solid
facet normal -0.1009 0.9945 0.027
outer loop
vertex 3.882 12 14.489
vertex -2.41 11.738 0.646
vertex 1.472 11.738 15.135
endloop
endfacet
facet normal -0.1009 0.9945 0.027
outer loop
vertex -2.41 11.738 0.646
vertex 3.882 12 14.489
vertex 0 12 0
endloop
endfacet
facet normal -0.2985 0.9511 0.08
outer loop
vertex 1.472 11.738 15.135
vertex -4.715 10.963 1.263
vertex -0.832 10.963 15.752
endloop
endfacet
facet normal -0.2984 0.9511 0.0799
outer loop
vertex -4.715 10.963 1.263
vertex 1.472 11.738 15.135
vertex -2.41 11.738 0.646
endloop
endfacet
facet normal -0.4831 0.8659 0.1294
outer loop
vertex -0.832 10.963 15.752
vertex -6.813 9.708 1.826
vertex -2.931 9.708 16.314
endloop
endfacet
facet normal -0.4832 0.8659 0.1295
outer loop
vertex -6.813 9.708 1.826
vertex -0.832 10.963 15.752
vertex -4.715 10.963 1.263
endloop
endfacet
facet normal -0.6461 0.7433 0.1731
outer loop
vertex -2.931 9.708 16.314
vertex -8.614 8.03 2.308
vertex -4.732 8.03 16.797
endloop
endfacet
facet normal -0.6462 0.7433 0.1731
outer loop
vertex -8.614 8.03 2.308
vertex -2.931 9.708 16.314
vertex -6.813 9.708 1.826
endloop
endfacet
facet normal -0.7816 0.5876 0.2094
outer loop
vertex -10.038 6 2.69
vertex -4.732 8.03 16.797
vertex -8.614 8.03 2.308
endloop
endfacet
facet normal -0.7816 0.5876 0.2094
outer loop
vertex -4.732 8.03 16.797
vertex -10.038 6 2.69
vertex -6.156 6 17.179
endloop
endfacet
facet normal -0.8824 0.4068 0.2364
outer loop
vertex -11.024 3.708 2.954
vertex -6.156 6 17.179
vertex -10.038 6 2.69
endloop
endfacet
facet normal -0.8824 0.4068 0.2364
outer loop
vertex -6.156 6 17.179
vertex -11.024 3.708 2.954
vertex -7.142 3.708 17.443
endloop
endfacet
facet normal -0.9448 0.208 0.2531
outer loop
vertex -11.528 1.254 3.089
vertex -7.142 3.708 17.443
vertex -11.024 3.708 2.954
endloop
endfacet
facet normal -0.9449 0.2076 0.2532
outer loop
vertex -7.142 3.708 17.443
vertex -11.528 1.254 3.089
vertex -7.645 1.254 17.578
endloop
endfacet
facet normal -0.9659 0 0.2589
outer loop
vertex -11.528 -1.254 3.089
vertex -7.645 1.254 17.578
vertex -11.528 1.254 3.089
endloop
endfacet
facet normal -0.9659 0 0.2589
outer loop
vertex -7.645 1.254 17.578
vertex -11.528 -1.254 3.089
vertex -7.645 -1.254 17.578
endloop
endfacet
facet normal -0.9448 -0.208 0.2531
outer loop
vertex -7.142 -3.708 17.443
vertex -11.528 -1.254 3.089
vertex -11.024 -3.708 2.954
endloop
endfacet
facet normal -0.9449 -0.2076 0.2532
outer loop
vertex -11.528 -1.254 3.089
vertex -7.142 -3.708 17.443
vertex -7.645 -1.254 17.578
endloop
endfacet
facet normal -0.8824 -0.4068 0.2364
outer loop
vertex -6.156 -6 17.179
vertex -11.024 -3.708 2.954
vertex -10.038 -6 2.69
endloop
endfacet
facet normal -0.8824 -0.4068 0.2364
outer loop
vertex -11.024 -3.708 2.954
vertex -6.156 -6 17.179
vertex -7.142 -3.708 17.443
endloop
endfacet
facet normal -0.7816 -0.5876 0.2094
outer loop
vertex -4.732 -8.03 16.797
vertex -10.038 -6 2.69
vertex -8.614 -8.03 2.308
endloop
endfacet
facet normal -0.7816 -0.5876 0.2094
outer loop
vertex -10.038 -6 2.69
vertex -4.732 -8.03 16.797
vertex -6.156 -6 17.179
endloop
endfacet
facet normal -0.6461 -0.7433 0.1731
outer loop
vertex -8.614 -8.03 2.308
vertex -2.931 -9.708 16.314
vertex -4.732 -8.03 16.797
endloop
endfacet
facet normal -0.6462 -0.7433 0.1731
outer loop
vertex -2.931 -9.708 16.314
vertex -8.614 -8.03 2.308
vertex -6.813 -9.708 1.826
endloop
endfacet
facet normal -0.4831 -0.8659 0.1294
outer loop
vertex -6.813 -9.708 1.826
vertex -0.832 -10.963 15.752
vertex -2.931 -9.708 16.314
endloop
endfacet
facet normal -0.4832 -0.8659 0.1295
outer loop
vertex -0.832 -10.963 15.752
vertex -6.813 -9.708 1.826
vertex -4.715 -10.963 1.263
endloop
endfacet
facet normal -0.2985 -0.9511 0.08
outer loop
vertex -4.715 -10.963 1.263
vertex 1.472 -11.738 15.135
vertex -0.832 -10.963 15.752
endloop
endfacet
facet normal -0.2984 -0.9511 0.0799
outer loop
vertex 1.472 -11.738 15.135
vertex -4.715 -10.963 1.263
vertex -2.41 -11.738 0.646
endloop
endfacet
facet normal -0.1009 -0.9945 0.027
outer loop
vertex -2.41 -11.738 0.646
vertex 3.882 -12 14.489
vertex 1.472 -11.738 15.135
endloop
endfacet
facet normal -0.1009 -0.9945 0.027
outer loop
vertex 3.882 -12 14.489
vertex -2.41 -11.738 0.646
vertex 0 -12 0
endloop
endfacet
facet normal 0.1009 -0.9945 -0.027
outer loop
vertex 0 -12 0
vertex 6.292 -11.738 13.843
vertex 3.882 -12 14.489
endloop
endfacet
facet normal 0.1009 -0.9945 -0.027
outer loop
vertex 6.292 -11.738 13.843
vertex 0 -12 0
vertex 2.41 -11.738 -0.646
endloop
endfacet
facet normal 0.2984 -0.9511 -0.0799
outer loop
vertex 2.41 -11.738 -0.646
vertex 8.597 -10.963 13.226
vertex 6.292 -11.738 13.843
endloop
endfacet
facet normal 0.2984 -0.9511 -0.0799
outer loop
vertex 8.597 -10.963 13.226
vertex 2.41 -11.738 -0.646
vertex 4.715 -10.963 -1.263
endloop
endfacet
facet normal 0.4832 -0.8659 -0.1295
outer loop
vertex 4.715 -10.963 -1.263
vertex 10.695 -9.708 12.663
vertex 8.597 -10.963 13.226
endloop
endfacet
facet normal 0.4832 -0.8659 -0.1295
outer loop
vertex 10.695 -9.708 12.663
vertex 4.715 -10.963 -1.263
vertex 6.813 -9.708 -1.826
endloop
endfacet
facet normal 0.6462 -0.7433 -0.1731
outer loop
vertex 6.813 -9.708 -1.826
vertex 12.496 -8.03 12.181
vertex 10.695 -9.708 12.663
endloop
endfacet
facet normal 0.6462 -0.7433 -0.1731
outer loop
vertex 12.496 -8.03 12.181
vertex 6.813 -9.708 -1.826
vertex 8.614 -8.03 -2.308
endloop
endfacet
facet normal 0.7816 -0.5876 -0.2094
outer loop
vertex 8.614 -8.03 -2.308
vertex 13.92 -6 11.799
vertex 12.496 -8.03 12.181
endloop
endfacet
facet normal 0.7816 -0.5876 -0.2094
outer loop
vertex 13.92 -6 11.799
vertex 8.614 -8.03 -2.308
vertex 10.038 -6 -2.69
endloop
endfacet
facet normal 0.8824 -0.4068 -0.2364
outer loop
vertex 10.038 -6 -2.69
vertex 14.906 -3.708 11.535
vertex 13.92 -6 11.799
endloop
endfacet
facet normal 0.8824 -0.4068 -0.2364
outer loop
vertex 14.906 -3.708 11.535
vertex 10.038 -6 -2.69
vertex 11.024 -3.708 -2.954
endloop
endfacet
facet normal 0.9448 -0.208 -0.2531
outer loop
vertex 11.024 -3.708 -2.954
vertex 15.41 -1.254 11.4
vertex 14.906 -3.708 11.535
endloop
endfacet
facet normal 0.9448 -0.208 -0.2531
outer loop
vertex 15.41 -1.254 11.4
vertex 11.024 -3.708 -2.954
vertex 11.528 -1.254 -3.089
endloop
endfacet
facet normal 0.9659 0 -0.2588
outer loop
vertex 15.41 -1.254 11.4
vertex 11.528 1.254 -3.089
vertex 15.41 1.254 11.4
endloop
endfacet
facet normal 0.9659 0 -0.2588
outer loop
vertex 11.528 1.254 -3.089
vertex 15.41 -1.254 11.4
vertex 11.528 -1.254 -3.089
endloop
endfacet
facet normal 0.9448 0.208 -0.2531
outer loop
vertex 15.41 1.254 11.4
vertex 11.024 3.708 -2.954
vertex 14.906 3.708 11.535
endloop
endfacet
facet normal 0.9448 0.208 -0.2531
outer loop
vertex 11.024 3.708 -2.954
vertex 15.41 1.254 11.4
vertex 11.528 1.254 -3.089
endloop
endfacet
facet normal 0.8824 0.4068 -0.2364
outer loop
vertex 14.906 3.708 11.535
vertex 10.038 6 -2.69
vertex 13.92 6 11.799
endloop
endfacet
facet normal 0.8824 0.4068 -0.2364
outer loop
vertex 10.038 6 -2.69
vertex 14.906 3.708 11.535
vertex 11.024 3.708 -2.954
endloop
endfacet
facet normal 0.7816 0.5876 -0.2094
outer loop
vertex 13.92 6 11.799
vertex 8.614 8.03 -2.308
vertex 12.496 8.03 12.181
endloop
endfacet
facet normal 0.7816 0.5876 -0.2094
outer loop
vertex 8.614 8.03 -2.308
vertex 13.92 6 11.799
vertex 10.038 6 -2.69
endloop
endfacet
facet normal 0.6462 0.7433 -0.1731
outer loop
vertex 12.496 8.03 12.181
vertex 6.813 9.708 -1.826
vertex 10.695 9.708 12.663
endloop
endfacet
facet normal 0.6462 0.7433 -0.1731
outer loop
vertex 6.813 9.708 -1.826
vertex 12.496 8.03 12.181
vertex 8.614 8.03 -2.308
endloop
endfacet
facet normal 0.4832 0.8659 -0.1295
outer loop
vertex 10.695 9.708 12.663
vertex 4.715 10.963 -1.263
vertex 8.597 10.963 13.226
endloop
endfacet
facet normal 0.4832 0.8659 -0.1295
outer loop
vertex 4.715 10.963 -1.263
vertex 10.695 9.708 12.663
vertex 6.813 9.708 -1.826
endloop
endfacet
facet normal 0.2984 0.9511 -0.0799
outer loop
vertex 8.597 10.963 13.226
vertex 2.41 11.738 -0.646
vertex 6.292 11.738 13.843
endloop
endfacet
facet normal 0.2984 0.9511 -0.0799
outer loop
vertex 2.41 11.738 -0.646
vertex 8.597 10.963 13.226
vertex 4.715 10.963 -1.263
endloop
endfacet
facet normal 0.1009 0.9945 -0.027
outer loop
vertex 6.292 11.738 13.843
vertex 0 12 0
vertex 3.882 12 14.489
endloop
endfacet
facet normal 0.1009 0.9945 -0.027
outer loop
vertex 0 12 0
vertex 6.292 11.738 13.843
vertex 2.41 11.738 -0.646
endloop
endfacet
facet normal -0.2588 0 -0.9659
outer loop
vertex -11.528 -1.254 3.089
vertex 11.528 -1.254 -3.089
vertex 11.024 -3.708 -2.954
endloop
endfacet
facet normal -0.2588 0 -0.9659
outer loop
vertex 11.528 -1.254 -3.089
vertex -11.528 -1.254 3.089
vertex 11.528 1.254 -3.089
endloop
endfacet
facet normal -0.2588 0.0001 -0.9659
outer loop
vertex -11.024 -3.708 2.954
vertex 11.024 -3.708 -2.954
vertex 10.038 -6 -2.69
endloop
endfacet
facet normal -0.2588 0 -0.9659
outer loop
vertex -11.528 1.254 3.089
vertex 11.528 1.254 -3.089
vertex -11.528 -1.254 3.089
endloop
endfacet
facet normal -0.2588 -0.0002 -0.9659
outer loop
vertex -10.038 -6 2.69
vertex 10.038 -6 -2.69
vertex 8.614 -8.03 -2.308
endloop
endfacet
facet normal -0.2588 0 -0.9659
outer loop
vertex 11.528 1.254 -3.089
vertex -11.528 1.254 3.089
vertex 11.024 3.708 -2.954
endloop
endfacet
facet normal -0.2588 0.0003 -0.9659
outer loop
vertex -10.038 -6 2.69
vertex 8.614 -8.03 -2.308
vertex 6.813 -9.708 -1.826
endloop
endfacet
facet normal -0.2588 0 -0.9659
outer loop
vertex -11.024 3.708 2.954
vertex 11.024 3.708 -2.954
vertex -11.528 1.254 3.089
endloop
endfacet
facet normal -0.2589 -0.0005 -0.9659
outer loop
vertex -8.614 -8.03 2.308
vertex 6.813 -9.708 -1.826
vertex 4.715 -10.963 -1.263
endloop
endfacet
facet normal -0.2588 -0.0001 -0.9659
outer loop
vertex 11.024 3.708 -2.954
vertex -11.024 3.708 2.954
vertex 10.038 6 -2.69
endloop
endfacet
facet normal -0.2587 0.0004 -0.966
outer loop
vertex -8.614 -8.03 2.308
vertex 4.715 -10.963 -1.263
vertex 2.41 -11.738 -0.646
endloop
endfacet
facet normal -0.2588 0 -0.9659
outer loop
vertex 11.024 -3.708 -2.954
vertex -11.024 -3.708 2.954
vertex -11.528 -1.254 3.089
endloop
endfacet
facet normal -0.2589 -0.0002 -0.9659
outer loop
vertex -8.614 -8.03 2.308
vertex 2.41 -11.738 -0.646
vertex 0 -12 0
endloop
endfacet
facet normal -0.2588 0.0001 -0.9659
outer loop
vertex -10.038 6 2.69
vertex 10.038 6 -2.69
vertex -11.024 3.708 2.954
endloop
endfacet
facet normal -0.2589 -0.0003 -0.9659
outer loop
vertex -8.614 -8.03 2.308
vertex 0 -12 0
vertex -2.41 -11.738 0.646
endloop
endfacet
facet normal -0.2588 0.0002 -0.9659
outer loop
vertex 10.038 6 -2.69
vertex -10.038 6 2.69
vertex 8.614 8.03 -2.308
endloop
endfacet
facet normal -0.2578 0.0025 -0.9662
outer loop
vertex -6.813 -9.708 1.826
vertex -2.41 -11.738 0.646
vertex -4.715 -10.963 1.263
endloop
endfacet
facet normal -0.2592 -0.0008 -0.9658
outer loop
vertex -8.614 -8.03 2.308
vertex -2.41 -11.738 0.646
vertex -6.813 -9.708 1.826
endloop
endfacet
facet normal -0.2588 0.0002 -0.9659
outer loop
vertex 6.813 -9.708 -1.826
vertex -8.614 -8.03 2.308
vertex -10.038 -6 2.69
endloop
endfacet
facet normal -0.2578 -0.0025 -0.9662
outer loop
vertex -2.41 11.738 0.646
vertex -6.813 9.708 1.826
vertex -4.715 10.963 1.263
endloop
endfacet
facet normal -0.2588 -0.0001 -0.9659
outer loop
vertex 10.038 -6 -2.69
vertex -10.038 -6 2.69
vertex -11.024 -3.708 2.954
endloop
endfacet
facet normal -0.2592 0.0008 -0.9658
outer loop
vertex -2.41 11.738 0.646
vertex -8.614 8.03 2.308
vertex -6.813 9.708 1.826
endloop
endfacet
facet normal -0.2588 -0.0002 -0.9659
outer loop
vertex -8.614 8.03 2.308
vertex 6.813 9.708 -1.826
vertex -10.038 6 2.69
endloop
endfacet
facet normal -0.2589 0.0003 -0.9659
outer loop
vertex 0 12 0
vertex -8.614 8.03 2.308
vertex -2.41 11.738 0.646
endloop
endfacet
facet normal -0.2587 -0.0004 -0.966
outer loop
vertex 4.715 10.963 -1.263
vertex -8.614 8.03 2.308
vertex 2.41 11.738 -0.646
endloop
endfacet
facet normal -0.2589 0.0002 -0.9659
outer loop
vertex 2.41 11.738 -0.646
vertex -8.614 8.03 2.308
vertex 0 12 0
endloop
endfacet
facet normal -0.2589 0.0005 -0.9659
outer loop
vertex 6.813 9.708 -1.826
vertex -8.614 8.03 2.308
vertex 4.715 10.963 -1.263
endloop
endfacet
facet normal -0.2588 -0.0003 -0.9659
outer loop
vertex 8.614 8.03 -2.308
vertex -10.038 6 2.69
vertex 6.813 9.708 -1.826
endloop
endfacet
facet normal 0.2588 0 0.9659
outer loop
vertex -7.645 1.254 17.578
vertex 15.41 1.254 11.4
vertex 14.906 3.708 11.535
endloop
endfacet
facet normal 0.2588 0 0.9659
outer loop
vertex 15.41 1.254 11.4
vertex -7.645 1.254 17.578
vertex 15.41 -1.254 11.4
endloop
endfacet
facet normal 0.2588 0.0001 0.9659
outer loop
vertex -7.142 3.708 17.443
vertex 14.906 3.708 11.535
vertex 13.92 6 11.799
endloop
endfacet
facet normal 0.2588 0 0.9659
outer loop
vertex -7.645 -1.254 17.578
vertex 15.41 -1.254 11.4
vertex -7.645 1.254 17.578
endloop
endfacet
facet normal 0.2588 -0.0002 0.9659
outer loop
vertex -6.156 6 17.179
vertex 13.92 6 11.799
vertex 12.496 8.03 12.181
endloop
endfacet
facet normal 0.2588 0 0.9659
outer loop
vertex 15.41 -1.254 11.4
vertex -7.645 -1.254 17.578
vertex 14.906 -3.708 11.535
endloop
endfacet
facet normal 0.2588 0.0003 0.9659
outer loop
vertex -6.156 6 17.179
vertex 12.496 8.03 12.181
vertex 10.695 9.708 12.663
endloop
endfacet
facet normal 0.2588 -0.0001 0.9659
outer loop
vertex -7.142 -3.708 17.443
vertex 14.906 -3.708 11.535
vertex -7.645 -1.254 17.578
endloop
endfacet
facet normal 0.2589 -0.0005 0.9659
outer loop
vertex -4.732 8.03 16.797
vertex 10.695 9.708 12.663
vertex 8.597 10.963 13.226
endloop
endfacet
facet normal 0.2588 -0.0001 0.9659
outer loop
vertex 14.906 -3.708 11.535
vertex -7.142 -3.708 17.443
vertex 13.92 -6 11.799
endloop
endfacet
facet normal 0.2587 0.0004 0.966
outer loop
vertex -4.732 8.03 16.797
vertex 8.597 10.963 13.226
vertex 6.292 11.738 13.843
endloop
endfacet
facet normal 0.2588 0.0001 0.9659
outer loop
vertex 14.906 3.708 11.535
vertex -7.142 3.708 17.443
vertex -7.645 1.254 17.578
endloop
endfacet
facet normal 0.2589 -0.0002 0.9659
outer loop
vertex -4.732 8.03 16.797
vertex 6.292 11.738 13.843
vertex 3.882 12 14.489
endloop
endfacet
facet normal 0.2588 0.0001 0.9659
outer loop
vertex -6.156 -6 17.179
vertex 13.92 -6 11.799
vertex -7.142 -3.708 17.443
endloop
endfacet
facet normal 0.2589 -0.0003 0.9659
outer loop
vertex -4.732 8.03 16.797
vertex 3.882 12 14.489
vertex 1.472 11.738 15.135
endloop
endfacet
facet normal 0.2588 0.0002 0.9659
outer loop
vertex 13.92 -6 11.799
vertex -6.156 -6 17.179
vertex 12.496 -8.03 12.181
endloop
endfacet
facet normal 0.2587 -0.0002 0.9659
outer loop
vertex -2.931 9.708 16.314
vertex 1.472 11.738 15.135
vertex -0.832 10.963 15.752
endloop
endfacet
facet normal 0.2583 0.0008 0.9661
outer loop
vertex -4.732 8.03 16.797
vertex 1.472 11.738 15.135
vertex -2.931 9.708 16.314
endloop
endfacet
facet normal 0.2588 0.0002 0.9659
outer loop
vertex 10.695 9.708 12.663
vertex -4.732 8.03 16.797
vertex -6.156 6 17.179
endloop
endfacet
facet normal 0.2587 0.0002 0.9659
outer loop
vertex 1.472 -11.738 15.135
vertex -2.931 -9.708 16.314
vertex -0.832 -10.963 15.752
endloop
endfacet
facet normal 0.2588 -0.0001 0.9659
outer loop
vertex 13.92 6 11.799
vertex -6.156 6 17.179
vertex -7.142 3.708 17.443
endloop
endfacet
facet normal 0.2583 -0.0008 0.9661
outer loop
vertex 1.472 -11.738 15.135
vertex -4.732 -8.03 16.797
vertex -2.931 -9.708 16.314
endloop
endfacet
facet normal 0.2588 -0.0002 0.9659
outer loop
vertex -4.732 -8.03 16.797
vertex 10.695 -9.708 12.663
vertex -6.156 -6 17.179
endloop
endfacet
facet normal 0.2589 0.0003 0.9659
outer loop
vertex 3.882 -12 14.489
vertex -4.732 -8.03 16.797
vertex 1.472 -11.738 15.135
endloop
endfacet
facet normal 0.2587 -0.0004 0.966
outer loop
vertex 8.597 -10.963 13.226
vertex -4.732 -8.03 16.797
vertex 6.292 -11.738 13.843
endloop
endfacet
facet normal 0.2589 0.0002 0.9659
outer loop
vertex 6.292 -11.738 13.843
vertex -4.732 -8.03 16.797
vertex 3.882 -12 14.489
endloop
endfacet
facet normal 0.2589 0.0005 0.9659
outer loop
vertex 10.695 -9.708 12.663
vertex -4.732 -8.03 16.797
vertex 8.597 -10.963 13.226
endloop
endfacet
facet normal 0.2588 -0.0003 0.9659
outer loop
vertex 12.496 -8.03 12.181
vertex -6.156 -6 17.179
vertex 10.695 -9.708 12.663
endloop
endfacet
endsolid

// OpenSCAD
// Generated by generate_scads.py
rotate([15,0,90]) {
  cylinder(h=15, r=12, center=false);
}
